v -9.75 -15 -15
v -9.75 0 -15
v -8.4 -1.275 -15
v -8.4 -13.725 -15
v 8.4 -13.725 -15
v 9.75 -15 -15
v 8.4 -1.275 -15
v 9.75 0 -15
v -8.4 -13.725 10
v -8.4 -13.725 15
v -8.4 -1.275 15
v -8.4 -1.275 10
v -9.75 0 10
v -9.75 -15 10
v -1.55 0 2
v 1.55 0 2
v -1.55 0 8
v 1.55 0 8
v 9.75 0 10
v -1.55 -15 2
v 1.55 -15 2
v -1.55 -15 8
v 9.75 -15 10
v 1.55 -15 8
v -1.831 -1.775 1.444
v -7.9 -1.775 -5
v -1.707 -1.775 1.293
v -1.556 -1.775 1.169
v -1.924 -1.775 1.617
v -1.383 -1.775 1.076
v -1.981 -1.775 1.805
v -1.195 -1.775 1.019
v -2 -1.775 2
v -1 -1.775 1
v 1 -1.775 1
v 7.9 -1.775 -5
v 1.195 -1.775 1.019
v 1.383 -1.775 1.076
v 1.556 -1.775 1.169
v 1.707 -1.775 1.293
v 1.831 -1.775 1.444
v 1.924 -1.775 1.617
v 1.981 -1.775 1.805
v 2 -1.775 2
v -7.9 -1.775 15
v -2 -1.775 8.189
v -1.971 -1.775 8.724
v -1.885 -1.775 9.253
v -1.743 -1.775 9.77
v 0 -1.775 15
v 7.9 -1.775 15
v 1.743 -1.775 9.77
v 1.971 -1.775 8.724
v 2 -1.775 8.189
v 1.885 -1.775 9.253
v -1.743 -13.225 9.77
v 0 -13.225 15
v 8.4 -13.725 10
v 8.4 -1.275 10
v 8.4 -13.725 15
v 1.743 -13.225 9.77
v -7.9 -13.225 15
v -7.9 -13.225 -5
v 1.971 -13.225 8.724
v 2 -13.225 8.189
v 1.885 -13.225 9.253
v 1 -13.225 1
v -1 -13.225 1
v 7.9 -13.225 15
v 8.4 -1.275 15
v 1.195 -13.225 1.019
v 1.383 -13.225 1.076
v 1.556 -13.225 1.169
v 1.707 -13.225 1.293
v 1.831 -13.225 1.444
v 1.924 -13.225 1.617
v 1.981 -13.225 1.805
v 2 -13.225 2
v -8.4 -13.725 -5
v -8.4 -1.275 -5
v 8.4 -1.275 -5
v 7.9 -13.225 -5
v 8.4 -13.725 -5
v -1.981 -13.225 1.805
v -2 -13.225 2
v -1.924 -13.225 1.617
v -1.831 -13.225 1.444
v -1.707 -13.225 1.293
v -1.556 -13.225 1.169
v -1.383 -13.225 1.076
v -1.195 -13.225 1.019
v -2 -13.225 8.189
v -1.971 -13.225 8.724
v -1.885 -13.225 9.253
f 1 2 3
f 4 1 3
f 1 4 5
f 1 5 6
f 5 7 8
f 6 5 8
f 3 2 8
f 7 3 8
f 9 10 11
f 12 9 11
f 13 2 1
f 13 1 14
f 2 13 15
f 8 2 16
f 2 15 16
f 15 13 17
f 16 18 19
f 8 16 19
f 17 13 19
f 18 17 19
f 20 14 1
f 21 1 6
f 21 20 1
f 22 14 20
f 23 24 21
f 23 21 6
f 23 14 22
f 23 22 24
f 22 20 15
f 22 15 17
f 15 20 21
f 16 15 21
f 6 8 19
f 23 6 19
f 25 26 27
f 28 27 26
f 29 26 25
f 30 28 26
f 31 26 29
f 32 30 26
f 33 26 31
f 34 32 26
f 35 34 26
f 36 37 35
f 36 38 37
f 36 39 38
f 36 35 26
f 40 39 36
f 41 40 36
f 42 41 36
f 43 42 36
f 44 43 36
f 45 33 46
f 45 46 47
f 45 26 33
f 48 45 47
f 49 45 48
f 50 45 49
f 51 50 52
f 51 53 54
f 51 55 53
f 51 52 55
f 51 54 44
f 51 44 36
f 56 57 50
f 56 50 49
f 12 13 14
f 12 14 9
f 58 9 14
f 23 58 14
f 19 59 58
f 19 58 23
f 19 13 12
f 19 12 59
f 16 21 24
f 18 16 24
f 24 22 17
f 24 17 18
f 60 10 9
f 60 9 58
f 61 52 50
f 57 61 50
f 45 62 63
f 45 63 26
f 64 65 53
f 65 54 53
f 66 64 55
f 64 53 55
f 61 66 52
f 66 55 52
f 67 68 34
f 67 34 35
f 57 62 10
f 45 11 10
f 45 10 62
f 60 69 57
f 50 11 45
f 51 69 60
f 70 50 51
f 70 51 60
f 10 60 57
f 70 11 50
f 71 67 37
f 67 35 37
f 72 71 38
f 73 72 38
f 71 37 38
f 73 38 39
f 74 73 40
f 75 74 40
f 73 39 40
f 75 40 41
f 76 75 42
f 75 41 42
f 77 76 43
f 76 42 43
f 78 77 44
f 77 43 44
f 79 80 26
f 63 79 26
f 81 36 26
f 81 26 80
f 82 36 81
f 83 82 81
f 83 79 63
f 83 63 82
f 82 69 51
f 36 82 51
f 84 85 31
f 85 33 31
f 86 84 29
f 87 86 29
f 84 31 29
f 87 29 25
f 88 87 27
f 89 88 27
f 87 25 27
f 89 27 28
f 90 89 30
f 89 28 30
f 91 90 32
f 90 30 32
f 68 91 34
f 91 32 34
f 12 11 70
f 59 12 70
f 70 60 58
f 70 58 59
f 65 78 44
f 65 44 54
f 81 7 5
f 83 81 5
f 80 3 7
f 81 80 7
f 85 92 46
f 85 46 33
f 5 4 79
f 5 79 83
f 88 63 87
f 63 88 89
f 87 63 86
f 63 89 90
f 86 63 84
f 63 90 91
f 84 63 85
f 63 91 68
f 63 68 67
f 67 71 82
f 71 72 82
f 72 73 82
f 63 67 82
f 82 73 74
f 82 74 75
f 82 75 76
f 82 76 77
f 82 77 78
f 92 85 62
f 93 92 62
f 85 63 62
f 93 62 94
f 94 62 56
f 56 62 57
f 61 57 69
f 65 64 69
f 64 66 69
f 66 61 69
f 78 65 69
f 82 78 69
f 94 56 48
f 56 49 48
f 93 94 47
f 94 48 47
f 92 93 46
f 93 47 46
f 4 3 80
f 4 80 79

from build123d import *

# Parameters (mm, degrees)
F0_W      = 19.5
F0_H      = 30
F1_DEPTH  = 15
F2_W      = 15.8
F2_H      = 11.45
F3_DEPTH  = 30
F5_DEPTH  = 15
F6_W      = 3.1
F6_H      = 6
F7_DEPTH  = 15
F8_R      = 5
F9_R      = 1
F10_W     = 19.5
F10_H     = 15
F10_W_2   = 16.8
F10_H_2   = 12.45
F11_DEPTH = 5
F12_W     = 16.8
F12_H     = 12.45
F13_DEPTH = 10


with BuildPart() as f1:
    # F0 (on Front) → F1 (new body)
    with BuildSketch(Plane.XZ):
        Rectangle(F0_W, F0_H)
    extrude(amount=F1_DEPTH)

    # F2 (on face) → F3 (cut, through all)
    with BuildSketch(Plane.XY.offset(15)):
        with Locations((0, -7.5)):
            Rectangle(F2_W, F2_H)
    extrude(amount=-F3_DEPTH, mode=Mode.SUBTRACT)

    # F4 (on face) → F5 (join, through all)
    with BuildSketch(Plane.XZ.offset(15)):
        Polygon((-2, 1), (2, 1), (2, 9), (0, 15), (-2, 9), align=None)
    extrude(amount=-F5_DEPTH)

    # F6 (on face) → F7 (cut, through all)
    with BuildSketch(Plane.XZ.offset(15)):
        with Locations((0, 5)):
            Rectangle(F6_W, F6_H)
    extrude(amount=-F7_DEPTH, mode=Mode.SUBTRACT)

    # F8
    f8_edges = [f1.edges().sort_by_distance(p)[0] for p in [
        (-2, -7.5, 9),
        (2, -7.5, 9),
    ]]
    fillet(f8_edges, radius=F8_R)

    # F9
    f9_edges = [f1.edges().sort_by_distance(p)[0] for p in [
        (-2, -7.5, 1),
        (2, -7.5, 1),
    ]]
    fillet(f9_edges, radius=F9_R)

    # F10 (on face) → F11 (cut)
    with BuildSketch(Plane.XY.offset(15)):
        with Locations((0, -7.5)):
            Rectangle(F10_W, F10_H)
        with Locations((0, -7.5)):
            Rectangle(F10_W_2, F10_H_2, mode=Mode.SUBTRACT)
    extrude(amount=-F11_DEPTH, mode=Mode.SUBTRACT)

    # F12 (on face) → F13 (cut)
    with BuildSketch(Plane(origin=(0, 0, -15), x_dir=(1, 0, 0), z_dir=(0, 0, -1))):
        with Locations((0, 7.5)):
            Rectangle(F12_W, F12_H)
    extrude(amount=-F13_DEPTH, mode=Mode.SUBTRACT)


solid = f1.part
